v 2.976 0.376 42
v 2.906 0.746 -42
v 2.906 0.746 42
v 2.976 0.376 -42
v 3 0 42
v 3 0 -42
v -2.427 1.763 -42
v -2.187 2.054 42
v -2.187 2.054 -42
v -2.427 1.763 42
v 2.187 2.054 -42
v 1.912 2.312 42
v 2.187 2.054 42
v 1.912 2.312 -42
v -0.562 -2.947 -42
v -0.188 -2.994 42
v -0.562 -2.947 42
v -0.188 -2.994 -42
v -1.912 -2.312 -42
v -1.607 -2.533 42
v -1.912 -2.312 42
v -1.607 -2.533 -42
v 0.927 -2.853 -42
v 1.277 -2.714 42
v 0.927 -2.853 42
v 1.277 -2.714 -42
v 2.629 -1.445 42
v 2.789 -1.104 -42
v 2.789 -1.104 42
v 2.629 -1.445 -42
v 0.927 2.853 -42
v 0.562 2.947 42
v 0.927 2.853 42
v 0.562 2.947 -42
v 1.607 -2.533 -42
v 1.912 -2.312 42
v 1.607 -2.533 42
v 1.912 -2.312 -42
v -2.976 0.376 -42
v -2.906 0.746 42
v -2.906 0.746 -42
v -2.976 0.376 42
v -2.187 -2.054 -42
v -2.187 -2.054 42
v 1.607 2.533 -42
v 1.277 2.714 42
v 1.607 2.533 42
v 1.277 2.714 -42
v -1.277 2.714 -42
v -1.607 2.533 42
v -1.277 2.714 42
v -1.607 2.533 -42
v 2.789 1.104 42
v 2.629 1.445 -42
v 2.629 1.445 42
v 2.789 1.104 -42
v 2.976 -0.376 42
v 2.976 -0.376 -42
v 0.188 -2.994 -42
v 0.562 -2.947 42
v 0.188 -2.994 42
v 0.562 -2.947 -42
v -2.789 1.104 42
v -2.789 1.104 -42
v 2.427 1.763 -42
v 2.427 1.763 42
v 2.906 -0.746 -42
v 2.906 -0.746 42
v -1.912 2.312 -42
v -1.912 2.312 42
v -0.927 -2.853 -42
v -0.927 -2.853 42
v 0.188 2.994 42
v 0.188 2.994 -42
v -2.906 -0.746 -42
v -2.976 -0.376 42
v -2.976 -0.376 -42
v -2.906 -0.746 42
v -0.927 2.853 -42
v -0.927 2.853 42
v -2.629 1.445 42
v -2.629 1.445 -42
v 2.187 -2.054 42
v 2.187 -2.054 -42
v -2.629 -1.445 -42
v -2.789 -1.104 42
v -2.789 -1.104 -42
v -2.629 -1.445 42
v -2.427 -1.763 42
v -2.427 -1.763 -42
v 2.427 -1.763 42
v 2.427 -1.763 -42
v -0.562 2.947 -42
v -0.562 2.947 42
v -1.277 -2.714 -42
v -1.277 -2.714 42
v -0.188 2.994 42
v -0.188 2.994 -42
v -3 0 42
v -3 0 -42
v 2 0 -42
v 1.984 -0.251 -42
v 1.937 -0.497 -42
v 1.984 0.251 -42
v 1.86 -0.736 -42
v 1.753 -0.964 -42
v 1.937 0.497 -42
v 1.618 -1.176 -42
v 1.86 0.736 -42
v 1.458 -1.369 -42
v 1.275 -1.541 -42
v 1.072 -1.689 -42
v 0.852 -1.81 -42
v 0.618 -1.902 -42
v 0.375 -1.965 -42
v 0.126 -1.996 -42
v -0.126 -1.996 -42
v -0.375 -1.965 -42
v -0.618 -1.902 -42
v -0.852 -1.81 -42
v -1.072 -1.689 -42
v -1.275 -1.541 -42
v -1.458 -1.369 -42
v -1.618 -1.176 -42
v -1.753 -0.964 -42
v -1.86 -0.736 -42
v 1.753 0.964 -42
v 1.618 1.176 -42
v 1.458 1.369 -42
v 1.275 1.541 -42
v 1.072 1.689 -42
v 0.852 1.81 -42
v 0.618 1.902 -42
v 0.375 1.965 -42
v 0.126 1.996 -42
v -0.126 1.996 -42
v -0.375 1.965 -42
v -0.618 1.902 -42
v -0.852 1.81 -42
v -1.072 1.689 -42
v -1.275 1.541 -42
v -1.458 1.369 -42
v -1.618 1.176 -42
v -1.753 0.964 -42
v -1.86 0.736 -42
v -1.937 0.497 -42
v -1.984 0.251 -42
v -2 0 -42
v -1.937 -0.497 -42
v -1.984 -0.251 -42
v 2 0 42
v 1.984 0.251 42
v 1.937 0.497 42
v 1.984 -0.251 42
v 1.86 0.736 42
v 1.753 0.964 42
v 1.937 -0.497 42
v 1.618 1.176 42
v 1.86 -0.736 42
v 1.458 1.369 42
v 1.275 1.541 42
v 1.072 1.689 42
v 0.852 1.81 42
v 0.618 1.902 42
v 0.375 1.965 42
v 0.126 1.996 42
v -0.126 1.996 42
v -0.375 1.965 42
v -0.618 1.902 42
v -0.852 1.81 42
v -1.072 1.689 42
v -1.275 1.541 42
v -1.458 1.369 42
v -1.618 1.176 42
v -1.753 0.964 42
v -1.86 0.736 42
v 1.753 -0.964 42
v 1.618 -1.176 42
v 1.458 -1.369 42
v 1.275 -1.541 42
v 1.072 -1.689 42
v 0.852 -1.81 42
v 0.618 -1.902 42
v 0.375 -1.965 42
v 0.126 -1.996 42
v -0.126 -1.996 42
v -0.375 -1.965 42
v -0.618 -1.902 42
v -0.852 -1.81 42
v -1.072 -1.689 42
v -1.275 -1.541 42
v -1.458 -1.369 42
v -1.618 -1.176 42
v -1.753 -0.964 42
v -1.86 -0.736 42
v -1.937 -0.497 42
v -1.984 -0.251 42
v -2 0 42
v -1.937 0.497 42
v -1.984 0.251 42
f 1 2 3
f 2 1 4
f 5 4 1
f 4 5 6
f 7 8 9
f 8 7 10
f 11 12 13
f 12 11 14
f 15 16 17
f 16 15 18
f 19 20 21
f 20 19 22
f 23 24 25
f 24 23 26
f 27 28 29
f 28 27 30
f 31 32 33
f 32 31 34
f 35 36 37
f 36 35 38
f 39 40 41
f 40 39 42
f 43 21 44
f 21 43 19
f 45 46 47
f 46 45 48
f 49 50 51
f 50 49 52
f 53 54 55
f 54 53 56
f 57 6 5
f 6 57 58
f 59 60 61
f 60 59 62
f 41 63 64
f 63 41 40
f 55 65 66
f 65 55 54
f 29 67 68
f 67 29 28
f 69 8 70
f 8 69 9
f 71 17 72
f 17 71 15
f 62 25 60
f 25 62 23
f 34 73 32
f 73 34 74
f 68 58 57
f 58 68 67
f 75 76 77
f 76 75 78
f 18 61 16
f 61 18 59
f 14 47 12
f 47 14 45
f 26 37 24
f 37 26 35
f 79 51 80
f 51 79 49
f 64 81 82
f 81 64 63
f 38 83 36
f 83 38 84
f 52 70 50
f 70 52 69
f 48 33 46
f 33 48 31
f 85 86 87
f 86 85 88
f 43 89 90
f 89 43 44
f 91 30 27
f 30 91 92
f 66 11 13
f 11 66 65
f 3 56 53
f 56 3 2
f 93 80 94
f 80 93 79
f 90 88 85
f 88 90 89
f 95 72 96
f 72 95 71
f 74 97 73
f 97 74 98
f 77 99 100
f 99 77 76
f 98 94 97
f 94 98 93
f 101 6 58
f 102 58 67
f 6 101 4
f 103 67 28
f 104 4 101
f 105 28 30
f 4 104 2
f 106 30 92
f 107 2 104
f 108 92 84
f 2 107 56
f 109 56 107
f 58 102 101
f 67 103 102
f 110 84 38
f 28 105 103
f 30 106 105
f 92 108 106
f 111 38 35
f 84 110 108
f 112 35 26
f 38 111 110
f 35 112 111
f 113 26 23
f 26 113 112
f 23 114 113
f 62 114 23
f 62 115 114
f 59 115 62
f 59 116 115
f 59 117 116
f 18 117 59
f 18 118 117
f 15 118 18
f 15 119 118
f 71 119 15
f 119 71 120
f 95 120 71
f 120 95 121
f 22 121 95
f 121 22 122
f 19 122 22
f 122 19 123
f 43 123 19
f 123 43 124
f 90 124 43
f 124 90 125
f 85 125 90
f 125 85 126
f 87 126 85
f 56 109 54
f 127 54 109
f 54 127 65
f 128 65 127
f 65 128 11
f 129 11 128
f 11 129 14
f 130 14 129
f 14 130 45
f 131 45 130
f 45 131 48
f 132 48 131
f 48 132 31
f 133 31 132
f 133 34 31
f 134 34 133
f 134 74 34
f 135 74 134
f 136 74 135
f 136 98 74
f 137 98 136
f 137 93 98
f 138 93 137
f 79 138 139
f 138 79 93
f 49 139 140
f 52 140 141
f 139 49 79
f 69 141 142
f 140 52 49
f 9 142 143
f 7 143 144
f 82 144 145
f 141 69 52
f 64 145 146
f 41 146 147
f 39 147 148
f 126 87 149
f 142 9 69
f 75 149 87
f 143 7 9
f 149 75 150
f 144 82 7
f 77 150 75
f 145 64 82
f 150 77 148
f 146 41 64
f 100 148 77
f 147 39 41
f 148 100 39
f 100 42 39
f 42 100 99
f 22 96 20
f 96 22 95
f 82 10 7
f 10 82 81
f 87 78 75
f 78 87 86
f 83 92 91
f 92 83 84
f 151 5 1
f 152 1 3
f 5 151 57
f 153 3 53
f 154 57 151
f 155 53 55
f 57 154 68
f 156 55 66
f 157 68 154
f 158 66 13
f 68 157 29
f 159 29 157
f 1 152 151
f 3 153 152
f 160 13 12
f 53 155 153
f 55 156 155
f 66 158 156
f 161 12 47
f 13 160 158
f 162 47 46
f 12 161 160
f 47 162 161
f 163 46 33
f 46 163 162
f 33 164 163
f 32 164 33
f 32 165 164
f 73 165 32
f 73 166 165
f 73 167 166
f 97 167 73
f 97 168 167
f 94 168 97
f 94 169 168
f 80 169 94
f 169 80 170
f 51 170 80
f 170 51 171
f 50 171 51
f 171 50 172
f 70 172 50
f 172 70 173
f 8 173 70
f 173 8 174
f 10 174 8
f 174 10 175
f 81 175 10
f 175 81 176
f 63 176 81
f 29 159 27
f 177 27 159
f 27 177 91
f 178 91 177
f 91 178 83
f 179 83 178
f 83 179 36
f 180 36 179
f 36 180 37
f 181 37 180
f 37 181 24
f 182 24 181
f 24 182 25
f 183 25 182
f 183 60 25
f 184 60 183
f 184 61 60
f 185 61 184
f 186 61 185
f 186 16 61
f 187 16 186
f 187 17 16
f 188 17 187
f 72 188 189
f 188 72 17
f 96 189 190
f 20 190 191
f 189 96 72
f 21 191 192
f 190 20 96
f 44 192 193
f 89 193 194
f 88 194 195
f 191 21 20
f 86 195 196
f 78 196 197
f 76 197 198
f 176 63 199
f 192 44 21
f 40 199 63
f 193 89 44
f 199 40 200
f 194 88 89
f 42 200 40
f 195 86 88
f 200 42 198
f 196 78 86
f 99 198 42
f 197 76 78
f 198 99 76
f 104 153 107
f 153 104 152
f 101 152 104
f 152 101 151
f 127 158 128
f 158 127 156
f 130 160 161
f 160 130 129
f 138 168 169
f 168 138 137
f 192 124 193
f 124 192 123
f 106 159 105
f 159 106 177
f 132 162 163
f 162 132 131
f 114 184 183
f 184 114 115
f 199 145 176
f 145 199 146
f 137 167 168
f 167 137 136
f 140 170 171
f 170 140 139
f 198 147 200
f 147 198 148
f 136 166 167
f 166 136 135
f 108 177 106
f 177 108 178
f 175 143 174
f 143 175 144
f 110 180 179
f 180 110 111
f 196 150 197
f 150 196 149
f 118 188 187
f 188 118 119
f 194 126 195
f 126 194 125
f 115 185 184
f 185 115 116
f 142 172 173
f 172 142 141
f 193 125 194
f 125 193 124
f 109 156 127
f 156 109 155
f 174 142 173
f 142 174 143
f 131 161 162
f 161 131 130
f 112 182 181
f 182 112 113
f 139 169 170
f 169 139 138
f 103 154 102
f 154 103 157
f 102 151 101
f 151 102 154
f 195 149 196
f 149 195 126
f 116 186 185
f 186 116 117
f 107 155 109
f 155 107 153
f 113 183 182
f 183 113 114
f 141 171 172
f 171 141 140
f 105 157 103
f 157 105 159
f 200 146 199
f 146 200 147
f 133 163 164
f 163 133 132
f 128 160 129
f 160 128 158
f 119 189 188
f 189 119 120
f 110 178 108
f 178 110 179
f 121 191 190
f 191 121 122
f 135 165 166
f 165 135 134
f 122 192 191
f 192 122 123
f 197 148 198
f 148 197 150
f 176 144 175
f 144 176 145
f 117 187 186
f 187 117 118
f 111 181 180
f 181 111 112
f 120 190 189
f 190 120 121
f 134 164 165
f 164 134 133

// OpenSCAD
$fn = 50;


difference() {
	union() {
		translate(v = [0, 0, -42.0000000000]) {
			cylinder(h = 84, r = 3.0000000000);
		}
	}
	union() {
		translate(v = [0, 0, -100.0000000000]) {
			cylinder(h = 200, r = 2.0000000000);
		}
	}
}
